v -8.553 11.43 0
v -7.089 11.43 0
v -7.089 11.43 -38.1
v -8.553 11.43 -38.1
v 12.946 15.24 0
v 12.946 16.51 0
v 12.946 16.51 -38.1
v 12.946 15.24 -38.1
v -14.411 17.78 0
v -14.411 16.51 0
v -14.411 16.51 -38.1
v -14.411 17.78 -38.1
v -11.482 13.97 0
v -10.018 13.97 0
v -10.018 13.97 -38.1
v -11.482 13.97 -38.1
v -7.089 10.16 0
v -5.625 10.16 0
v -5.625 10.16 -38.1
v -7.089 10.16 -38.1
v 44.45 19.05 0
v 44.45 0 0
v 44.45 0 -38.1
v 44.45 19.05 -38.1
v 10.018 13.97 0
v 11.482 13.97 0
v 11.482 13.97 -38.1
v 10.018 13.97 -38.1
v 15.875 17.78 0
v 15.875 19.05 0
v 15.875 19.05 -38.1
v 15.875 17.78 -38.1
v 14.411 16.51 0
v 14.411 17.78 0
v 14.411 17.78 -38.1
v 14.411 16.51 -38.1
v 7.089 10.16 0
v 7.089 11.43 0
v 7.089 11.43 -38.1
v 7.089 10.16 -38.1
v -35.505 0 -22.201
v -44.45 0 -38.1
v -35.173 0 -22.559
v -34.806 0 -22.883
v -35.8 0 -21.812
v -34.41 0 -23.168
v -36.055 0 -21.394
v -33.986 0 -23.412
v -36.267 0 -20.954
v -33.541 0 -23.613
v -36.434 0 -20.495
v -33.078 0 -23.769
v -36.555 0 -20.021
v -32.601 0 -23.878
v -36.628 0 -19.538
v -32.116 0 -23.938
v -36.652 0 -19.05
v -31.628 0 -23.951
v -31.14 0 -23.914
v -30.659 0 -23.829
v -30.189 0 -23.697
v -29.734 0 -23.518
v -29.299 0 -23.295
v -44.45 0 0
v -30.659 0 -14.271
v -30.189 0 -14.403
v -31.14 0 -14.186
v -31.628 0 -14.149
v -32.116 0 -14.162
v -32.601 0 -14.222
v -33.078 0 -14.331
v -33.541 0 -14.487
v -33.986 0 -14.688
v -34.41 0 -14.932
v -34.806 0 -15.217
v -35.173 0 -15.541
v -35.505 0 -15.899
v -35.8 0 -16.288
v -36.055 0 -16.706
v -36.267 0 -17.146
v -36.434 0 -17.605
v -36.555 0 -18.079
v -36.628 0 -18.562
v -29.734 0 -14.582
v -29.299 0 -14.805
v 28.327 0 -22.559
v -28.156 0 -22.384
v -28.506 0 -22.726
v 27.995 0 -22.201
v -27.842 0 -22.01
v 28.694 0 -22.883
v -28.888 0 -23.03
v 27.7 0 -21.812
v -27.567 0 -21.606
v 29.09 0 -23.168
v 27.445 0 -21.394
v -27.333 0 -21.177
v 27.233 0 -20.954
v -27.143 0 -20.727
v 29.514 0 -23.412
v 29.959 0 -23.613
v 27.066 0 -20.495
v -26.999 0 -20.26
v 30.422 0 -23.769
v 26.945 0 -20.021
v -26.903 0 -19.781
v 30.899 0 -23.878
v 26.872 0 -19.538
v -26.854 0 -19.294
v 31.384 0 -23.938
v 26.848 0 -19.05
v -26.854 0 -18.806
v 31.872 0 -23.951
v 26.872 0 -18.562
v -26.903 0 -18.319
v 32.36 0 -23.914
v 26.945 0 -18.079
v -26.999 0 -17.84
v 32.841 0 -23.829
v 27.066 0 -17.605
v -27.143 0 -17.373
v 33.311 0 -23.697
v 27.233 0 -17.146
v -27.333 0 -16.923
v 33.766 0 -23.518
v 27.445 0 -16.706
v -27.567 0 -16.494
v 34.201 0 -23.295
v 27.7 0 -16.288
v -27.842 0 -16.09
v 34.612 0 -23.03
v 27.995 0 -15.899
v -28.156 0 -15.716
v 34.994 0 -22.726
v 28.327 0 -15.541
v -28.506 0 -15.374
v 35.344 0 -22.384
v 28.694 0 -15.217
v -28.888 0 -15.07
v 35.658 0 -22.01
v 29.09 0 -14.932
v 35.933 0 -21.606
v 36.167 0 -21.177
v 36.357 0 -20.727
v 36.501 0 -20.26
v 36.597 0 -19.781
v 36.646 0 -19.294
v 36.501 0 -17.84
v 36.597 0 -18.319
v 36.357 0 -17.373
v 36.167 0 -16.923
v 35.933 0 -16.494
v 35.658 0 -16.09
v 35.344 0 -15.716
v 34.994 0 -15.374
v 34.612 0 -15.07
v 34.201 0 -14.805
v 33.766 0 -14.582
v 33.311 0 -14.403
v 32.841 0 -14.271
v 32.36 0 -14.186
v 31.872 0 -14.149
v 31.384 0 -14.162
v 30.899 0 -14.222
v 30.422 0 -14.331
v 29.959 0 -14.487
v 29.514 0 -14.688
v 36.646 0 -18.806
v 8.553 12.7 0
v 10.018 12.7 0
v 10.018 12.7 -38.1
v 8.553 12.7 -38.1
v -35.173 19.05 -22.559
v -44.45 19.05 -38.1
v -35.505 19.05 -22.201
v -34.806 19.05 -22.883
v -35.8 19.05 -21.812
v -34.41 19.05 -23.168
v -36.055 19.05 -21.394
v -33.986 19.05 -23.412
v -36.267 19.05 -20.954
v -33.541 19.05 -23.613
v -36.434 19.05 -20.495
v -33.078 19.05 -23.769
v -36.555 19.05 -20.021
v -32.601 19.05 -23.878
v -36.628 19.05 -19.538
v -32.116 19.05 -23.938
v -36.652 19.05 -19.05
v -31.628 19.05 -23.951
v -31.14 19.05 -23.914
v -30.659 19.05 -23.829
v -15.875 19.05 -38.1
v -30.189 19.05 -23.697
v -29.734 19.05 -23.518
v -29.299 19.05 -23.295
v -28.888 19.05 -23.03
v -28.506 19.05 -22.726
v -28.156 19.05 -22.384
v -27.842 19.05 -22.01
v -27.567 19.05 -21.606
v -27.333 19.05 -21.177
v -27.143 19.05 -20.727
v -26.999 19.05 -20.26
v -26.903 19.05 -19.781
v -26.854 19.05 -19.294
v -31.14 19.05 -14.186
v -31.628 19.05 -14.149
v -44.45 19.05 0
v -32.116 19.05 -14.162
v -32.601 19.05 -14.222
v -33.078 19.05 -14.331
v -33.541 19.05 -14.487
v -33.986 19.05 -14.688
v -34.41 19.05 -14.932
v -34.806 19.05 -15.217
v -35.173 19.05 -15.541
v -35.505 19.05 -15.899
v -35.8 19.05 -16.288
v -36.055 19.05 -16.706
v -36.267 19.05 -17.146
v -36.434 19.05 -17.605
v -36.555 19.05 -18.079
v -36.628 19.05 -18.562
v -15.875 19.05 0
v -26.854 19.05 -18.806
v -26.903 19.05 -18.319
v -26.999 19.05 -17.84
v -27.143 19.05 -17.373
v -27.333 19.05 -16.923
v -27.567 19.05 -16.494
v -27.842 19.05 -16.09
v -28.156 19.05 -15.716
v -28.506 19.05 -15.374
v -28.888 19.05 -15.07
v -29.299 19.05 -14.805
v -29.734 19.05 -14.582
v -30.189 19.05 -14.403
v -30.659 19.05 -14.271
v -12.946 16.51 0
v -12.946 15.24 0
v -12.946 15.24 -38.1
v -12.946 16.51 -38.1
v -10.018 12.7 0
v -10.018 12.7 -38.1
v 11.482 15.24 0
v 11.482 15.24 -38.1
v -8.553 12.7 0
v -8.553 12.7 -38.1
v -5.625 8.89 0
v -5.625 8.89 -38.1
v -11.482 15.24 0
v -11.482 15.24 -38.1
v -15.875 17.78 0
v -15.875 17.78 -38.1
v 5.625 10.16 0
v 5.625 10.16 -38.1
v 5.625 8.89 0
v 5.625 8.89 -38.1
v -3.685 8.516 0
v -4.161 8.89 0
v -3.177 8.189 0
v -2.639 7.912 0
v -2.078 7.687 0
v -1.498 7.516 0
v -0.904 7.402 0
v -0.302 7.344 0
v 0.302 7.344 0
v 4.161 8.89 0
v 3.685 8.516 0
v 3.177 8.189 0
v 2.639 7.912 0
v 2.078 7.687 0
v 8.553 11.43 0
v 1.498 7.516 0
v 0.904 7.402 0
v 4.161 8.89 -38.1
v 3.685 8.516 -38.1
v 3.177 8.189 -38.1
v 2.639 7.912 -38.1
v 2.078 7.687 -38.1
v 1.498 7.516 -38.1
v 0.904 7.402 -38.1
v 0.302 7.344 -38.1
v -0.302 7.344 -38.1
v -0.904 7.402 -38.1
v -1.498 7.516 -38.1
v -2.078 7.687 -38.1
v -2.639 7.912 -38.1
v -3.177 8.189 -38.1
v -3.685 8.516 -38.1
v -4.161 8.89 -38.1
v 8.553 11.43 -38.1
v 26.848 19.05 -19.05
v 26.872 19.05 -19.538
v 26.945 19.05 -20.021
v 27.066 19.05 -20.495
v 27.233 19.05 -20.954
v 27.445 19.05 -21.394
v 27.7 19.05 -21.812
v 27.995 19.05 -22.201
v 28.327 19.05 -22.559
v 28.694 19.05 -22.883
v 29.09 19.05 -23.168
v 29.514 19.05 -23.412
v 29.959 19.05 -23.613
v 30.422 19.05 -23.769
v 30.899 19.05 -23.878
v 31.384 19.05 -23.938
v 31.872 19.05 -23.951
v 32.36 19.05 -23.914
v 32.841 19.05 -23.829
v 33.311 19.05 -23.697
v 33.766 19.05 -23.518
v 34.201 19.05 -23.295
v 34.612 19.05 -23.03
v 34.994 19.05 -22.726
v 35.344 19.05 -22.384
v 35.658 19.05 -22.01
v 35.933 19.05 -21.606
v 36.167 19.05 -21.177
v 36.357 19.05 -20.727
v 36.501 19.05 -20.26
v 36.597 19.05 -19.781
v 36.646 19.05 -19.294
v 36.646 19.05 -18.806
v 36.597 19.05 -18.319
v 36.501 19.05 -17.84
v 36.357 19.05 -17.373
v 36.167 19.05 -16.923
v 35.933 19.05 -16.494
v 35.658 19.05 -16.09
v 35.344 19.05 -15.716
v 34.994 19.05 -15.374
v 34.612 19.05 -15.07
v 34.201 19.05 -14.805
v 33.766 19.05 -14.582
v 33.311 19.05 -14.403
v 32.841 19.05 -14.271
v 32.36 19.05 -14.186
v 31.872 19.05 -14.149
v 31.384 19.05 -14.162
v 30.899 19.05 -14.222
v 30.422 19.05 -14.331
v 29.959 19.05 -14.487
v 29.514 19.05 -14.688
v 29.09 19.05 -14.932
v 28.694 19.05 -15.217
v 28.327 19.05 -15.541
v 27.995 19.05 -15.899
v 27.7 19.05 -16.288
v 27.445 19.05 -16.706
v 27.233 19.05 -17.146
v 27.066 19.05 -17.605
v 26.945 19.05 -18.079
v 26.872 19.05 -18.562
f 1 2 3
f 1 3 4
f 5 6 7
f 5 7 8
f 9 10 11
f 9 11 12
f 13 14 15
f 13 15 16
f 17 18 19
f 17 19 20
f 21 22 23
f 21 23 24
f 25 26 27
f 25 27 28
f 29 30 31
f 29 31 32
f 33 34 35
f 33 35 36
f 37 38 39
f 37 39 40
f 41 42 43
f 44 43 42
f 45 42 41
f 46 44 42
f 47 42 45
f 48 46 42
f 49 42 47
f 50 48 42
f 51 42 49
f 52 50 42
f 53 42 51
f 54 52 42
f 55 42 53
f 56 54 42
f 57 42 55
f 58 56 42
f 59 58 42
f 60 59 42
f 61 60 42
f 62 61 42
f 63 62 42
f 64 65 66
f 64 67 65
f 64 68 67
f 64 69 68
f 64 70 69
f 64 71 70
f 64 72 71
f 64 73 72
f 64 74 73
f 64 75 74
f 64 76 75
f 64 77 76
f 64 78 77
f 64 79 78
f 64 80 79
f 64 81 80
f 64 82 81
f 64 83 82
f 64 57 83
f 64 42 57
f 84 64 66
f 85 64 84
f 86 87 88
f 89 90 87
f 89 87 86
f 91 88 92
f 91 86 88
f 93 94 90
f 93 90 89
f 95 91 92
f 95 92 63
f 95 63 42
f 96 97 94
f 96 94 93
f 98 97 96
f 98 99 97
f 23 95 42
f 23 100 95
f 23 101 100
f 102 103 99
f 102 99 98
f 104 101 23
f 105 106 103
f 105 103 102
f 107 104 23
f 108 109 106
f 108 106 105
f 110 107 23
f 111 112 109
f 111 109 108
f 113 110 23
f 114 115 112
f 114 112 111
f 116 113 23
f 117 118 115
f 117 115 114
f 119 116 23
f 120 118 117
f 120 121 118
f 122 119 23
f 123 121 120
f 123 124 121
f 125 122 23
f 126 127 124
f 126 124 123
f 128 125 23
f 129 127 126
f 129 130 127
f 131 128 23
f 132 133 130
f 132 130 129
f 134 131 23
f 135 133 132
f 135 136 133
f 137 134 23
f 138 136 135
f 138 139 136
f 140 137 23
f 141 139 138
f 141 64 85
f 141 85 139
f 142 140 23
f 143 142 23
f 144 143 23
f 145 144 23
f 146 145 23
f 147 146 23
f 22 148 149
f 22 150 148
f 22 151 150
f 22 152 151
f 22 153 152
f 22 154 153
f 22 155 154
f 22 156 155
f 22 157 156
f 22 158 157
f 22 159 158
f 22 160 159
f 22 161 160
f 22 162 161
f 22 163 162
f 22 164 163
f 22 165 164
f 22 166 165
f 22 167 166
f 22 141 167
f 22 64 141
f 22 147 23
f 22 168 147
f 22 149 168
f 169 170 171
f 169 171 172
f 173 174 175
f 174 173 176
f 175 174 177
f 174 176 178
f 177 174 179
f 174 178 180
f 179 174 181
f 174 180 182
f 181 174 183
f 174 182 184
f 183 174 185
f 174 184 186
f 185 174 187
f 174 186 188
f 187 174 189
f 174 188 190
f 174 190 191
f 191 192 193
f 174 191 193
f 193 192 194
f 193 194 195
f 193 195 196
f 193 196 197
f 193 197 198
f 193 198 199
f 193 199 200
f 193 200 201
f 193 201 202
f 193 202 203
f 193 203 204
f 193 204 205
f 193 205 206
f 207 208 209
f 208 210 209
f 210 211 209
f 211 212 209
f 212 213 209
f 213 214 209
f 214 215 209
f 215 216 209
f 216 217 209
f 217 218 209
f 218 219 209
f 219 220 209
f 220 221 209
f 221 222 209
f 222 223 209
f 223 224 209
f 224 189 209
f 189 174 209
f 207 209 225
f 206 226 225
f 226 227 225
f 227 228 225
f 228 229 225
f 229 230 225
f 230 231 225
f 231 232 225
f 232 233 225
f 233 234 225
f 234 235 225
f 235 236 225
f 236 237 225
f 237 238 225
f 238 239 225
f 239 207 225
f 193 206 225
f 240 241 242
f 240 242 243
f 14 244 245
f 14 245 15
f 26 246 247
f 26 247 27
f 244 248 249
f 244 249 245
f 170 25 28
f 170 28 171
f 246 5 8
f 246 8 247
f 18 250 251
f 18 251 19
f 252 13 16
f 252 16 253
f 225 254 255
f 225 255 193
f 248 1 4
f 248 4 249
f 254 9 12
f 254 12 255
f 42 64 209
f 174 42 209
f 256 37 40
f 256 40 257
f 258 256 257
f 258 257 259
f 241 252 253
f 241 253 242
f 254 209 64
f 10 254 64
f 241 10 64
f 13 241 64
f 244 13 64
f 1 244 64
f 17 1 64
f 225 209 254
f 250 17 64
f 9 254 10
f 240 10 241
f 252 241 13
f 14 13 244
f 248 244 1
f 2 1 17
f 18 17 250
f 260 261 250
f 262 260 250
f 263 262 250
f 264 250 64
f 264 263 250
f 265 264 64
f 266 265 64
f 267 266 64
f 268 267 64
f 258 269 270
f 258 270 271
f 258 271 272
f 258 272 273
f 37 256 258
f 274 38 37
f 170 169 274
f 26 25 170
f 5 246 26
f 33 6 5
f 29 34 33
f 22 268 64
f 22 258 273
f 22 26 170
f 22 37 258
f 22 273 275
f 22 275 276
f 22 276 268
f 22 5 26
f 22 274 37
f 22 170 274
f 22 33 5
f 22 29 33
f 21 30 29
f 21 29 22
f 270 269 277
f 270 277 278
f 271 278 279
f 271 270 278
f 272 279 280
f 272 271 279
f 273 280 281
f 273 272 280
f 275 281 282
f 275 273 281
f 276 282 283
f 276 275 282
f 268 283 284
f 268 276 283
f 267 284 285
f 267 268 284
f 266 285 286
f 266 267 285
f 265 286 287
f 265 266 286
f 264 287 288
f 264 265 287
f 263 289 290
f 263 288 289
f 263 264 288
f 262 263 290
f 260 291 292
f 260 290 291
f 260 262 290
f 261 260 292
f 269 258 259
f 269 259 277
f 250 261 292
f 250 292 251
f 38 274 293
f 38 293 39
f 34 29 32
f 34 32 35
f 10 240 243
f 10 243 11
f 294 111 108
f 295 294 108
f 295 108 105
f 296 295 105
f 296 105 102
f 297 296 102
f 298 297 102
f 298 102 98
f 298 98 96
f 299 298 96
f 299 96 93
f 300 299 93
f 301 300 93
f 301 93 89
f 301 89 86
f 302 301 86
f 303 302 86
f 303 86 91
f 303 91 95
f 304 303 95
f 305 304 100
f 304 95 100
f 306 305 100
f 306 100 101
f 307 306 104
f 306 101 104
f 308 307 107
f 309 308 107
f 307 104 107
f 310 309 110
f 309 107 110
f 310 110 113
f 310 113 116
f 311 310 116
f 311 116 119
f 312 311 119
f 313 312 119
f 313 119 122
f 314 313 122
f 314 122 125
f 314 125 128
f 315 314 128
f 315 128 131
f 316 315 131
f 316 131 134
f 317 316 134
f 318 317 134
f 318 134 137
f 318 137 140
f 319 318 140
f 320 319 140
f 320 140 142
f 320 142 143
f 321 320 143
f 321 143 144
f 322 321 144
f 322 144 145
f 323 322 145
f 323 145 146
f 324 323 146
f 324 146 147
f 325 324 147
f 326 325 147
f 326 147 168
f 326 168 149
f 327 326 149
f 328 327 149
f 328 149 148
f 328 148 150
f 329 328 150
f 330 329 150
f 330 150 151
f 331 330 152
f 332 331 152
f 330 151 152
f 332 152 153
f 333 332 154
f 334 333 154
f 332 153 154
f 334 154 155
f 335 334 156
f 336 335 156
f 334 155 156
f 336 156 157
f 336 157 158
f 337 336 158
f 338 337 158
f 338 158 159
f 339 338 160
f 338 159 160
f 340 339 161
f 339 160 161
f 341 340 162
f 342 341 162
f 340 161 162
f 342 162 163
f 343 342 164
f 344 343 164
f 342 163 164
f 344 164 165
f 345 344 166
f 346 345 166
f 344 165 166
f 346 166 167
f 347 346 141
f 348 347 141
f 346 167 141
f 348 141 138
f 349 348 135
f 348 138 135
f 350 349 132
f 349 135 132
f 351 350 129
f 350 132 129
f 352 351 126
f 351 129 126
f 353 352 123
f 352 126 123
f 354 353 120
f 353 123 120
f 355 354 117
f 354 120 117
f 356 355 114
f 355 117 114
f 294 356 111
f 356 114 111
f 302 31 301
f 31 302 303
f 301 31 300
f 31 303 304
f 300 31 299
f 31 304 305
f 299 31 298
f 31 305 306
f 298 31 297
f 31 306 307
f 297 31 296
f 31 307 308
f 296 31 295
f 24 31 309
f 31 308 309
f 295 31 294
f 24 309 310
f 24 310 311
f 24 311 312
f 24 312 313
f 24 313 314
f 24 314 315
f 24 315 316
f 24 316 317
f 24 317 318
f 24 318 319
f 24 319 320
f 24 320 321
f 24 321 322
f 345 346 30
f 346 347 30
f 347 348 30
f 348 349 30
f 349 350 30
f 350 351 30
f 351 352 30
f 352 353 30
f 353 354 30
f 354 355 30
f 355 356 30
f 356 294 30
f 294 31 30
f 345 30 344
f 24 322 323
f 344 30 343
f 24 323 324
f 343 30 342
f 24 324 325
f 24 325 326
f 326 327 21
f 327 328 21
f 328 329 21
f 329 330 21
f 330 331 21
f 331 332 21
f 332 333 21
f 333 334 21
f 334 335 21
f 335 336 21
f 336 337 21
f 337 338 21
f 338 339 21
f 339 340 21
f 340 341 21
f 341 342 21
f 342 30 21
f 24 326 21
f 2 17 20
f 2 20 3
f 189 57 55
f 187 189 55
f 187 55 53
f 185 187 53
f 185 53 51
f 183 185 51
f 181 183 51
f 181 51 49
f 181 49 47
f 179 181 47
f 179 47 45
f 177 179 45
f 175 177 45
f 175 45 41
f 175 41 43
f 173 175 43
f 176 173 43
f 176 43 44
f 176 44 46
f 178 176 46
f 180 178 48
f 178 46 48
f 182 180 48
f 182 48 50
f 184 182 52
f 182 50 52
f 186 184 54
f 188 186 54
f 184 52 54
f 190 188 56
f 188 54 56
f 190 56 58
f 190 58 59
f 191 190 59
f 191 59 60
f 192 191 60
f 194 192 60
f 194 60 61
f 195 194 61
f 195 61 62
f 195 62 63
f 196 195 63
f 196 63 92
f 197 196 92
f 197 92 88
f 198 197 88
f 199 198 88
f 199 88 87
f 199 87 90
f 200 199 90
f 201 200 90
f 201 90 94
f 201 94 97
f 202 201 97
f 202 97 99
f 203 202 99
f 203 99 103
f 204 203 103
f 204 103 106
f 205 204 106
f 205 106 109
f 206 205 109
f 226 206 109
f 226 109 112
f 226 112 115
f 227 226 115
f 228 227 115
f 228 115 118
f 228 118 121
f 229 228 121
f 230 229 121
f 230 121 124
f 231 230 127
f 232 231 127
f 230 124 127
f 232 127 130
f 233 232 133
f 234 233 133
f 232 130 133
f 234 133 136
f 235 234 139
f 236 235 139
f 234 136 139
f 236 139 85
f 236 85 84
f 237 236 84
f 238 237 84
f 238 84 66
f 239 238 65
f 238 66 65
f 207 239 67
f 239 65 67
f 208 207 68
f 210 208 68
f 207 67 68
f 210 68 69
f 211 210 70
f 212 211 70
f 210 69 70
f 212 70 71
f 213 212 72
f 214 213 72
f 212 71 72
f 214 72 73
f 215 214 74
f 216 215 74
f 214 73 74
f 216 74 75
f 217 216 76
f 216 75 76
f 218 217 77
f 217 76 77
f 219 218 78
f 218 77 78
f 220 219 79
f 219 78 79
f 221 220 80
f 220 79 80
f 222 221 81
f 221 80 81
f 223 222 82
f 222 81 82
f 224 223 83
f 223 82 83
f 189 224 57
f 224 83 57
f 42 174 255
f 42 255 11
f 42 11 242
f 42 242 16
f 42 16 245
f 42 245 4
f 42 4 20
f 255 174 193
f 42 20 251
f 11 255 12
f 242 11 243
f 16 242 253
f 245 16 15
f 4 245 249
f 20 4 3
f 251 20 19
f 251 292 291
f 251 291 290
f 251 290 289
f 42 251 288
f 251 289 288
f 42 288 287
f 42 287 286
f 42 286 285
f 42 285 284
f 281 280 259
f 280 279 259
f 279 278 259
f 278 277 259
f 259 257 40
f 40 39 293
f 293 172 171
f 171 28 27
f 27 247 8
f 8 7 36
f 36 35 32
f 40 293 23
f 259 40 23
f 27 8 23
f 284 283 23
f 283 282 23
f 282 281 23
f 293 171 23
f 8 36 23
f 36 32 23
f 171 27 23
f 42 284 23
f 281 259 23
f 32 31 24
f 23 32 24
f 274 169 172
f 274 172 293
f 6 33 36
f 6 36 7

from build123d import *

# Parameters (mm, degrees)
SKETCH1_W               = 88.9
SKETCH1_H               = 19.05
BOSS_EXTRUDE1_DEPTH     = 38.1
CUT_EXTRUDE1_REACH      = 40.1
F_3_8_CLEARANCE_HOLE1_D = 9.8044


with BuildPart() as part:
    # Sketch1 → Boss-Extrude1 (new body)
    with BuildSketch(Plane.XY):
        with Locations((0, 9.525)):
            Rectangle(SKETCH1_W, SKETCH1_H)
    extrude(amount=-BOSS_EXTRUDE1_DEPTH)

    # Sketch2 → Cut-Extrude1 (cut, up to next)
    with BuildSketch(Plane.XY, mode=Mode.PRIVATE) as cut_extrude1_sk1:
        with BuildLine():
            Line((-15.875, 19.05), (0, 19.05))
            Line((0, 19.05), (15.875, 19.05))
            Line((15.875, 19.05), (15.875, 17.78))
            Line((15.875, 17.78), (14.410694861, 17.78))
            Line((14.410694861, 17.78), (14.410694861, 16.51))
            Line((14.410694861, 16.51), (12.946389723, 16.51))
            Line((12.946389723, 16.51), (12.946389723, 15.24))
            Line((12.946389723, 15.24), (11.482084584, 15.24))
            Line((11.482084584, 15.24), (11.482084584, 13.97))
            Line((11.482084584, 13.97), (10.017779445, 13.97))
            Line((10.017779445, 13.97), (10.017779445, 12.7))
            Line((10.017779445, 12.7), (8.553474306, 12.7))
            Line((8.553474306, 12.7), (8.553474306, 11.43))
            Line((8.553474306, 11.43), (7.089169168, 11.43))
            Line((7.089169168, 11.43), (7.089169168, 10.16))
            Line((7.089169168, 10.16), (5.624864029, 10.16))
            Line((5.624864029, 10.16), (5.624864029, 8.89))
            Line((5.624864029, 8.89), (4.16055889, 8.89))
            ThreePointArc((4.16055889, 8.89), (0, 7.337108475), (-4.16055889, 8.89))
            Line((-4.16055889, 8.89), (-5.624864029, 8.89))
            Line((-5.624864029, 8.89), (-5.624864029, 10.16))
            Line((-5.624864029, 10.16), (-7.089169168, 10.16))
            Line((-7.089169168, 10.16), (-7.089169168, 11.43))
            Line((-7.089169168, 11.43), (-8.553474306, 11.43))
            Line((-8.553474306, 11.43), (-8.553474306, 12.7))
            Line((-8.553474306, 12.7), (-10.017779445, 12.7))
            Line((-10.017779445, 12.7), (-10.017779445, 13.97))
            Line((-10.017779445, 13.97), (-11.482084584, 13.97))
            Line((-11.482084584, 13.97), (-11.482084584, 15.24))
            Line((-11.482084584, 15.24), (-12.946389723, 15.24))
            Line((-12.946389723, 15.24), (-12.946389723, 16.51))
            Line((-12.946389723, 16.51), (-14.410694861, 16.51))
            Line((-14.410694861, 16.51), (-14.410694861, 17.78))
            Line((-14.410694861, 17.78), (-15.875, 17.78))
            Line((-15.875, 17.78), (-15.875, 19.05))
        make_face()
    cut_extrude1_tool1 = extrude(cut_extrude1_sk1.sketch, amount=-CUT_EXTRUDE1_REACH, mode=Mode.PRIVATE) & part.part
    add(cut_extrude1_tool1.solids().sort_by_distance((0, 14.620592, 0))[0], mode=Mode.SUBTRACT)

    # 3/8 Clearance Hole1 (through all)
    with Locations(Plane(origin=(0, 19.05, 0), x_dir=(1, 0, 0), z_dir=(0, 1, 0))):
        with Locations((-31.75, 19.05), (31.75, 19.05)):
            Hole(F_3_8_CLEARANCE_HOLE1_D / 2)


solid = part.part
